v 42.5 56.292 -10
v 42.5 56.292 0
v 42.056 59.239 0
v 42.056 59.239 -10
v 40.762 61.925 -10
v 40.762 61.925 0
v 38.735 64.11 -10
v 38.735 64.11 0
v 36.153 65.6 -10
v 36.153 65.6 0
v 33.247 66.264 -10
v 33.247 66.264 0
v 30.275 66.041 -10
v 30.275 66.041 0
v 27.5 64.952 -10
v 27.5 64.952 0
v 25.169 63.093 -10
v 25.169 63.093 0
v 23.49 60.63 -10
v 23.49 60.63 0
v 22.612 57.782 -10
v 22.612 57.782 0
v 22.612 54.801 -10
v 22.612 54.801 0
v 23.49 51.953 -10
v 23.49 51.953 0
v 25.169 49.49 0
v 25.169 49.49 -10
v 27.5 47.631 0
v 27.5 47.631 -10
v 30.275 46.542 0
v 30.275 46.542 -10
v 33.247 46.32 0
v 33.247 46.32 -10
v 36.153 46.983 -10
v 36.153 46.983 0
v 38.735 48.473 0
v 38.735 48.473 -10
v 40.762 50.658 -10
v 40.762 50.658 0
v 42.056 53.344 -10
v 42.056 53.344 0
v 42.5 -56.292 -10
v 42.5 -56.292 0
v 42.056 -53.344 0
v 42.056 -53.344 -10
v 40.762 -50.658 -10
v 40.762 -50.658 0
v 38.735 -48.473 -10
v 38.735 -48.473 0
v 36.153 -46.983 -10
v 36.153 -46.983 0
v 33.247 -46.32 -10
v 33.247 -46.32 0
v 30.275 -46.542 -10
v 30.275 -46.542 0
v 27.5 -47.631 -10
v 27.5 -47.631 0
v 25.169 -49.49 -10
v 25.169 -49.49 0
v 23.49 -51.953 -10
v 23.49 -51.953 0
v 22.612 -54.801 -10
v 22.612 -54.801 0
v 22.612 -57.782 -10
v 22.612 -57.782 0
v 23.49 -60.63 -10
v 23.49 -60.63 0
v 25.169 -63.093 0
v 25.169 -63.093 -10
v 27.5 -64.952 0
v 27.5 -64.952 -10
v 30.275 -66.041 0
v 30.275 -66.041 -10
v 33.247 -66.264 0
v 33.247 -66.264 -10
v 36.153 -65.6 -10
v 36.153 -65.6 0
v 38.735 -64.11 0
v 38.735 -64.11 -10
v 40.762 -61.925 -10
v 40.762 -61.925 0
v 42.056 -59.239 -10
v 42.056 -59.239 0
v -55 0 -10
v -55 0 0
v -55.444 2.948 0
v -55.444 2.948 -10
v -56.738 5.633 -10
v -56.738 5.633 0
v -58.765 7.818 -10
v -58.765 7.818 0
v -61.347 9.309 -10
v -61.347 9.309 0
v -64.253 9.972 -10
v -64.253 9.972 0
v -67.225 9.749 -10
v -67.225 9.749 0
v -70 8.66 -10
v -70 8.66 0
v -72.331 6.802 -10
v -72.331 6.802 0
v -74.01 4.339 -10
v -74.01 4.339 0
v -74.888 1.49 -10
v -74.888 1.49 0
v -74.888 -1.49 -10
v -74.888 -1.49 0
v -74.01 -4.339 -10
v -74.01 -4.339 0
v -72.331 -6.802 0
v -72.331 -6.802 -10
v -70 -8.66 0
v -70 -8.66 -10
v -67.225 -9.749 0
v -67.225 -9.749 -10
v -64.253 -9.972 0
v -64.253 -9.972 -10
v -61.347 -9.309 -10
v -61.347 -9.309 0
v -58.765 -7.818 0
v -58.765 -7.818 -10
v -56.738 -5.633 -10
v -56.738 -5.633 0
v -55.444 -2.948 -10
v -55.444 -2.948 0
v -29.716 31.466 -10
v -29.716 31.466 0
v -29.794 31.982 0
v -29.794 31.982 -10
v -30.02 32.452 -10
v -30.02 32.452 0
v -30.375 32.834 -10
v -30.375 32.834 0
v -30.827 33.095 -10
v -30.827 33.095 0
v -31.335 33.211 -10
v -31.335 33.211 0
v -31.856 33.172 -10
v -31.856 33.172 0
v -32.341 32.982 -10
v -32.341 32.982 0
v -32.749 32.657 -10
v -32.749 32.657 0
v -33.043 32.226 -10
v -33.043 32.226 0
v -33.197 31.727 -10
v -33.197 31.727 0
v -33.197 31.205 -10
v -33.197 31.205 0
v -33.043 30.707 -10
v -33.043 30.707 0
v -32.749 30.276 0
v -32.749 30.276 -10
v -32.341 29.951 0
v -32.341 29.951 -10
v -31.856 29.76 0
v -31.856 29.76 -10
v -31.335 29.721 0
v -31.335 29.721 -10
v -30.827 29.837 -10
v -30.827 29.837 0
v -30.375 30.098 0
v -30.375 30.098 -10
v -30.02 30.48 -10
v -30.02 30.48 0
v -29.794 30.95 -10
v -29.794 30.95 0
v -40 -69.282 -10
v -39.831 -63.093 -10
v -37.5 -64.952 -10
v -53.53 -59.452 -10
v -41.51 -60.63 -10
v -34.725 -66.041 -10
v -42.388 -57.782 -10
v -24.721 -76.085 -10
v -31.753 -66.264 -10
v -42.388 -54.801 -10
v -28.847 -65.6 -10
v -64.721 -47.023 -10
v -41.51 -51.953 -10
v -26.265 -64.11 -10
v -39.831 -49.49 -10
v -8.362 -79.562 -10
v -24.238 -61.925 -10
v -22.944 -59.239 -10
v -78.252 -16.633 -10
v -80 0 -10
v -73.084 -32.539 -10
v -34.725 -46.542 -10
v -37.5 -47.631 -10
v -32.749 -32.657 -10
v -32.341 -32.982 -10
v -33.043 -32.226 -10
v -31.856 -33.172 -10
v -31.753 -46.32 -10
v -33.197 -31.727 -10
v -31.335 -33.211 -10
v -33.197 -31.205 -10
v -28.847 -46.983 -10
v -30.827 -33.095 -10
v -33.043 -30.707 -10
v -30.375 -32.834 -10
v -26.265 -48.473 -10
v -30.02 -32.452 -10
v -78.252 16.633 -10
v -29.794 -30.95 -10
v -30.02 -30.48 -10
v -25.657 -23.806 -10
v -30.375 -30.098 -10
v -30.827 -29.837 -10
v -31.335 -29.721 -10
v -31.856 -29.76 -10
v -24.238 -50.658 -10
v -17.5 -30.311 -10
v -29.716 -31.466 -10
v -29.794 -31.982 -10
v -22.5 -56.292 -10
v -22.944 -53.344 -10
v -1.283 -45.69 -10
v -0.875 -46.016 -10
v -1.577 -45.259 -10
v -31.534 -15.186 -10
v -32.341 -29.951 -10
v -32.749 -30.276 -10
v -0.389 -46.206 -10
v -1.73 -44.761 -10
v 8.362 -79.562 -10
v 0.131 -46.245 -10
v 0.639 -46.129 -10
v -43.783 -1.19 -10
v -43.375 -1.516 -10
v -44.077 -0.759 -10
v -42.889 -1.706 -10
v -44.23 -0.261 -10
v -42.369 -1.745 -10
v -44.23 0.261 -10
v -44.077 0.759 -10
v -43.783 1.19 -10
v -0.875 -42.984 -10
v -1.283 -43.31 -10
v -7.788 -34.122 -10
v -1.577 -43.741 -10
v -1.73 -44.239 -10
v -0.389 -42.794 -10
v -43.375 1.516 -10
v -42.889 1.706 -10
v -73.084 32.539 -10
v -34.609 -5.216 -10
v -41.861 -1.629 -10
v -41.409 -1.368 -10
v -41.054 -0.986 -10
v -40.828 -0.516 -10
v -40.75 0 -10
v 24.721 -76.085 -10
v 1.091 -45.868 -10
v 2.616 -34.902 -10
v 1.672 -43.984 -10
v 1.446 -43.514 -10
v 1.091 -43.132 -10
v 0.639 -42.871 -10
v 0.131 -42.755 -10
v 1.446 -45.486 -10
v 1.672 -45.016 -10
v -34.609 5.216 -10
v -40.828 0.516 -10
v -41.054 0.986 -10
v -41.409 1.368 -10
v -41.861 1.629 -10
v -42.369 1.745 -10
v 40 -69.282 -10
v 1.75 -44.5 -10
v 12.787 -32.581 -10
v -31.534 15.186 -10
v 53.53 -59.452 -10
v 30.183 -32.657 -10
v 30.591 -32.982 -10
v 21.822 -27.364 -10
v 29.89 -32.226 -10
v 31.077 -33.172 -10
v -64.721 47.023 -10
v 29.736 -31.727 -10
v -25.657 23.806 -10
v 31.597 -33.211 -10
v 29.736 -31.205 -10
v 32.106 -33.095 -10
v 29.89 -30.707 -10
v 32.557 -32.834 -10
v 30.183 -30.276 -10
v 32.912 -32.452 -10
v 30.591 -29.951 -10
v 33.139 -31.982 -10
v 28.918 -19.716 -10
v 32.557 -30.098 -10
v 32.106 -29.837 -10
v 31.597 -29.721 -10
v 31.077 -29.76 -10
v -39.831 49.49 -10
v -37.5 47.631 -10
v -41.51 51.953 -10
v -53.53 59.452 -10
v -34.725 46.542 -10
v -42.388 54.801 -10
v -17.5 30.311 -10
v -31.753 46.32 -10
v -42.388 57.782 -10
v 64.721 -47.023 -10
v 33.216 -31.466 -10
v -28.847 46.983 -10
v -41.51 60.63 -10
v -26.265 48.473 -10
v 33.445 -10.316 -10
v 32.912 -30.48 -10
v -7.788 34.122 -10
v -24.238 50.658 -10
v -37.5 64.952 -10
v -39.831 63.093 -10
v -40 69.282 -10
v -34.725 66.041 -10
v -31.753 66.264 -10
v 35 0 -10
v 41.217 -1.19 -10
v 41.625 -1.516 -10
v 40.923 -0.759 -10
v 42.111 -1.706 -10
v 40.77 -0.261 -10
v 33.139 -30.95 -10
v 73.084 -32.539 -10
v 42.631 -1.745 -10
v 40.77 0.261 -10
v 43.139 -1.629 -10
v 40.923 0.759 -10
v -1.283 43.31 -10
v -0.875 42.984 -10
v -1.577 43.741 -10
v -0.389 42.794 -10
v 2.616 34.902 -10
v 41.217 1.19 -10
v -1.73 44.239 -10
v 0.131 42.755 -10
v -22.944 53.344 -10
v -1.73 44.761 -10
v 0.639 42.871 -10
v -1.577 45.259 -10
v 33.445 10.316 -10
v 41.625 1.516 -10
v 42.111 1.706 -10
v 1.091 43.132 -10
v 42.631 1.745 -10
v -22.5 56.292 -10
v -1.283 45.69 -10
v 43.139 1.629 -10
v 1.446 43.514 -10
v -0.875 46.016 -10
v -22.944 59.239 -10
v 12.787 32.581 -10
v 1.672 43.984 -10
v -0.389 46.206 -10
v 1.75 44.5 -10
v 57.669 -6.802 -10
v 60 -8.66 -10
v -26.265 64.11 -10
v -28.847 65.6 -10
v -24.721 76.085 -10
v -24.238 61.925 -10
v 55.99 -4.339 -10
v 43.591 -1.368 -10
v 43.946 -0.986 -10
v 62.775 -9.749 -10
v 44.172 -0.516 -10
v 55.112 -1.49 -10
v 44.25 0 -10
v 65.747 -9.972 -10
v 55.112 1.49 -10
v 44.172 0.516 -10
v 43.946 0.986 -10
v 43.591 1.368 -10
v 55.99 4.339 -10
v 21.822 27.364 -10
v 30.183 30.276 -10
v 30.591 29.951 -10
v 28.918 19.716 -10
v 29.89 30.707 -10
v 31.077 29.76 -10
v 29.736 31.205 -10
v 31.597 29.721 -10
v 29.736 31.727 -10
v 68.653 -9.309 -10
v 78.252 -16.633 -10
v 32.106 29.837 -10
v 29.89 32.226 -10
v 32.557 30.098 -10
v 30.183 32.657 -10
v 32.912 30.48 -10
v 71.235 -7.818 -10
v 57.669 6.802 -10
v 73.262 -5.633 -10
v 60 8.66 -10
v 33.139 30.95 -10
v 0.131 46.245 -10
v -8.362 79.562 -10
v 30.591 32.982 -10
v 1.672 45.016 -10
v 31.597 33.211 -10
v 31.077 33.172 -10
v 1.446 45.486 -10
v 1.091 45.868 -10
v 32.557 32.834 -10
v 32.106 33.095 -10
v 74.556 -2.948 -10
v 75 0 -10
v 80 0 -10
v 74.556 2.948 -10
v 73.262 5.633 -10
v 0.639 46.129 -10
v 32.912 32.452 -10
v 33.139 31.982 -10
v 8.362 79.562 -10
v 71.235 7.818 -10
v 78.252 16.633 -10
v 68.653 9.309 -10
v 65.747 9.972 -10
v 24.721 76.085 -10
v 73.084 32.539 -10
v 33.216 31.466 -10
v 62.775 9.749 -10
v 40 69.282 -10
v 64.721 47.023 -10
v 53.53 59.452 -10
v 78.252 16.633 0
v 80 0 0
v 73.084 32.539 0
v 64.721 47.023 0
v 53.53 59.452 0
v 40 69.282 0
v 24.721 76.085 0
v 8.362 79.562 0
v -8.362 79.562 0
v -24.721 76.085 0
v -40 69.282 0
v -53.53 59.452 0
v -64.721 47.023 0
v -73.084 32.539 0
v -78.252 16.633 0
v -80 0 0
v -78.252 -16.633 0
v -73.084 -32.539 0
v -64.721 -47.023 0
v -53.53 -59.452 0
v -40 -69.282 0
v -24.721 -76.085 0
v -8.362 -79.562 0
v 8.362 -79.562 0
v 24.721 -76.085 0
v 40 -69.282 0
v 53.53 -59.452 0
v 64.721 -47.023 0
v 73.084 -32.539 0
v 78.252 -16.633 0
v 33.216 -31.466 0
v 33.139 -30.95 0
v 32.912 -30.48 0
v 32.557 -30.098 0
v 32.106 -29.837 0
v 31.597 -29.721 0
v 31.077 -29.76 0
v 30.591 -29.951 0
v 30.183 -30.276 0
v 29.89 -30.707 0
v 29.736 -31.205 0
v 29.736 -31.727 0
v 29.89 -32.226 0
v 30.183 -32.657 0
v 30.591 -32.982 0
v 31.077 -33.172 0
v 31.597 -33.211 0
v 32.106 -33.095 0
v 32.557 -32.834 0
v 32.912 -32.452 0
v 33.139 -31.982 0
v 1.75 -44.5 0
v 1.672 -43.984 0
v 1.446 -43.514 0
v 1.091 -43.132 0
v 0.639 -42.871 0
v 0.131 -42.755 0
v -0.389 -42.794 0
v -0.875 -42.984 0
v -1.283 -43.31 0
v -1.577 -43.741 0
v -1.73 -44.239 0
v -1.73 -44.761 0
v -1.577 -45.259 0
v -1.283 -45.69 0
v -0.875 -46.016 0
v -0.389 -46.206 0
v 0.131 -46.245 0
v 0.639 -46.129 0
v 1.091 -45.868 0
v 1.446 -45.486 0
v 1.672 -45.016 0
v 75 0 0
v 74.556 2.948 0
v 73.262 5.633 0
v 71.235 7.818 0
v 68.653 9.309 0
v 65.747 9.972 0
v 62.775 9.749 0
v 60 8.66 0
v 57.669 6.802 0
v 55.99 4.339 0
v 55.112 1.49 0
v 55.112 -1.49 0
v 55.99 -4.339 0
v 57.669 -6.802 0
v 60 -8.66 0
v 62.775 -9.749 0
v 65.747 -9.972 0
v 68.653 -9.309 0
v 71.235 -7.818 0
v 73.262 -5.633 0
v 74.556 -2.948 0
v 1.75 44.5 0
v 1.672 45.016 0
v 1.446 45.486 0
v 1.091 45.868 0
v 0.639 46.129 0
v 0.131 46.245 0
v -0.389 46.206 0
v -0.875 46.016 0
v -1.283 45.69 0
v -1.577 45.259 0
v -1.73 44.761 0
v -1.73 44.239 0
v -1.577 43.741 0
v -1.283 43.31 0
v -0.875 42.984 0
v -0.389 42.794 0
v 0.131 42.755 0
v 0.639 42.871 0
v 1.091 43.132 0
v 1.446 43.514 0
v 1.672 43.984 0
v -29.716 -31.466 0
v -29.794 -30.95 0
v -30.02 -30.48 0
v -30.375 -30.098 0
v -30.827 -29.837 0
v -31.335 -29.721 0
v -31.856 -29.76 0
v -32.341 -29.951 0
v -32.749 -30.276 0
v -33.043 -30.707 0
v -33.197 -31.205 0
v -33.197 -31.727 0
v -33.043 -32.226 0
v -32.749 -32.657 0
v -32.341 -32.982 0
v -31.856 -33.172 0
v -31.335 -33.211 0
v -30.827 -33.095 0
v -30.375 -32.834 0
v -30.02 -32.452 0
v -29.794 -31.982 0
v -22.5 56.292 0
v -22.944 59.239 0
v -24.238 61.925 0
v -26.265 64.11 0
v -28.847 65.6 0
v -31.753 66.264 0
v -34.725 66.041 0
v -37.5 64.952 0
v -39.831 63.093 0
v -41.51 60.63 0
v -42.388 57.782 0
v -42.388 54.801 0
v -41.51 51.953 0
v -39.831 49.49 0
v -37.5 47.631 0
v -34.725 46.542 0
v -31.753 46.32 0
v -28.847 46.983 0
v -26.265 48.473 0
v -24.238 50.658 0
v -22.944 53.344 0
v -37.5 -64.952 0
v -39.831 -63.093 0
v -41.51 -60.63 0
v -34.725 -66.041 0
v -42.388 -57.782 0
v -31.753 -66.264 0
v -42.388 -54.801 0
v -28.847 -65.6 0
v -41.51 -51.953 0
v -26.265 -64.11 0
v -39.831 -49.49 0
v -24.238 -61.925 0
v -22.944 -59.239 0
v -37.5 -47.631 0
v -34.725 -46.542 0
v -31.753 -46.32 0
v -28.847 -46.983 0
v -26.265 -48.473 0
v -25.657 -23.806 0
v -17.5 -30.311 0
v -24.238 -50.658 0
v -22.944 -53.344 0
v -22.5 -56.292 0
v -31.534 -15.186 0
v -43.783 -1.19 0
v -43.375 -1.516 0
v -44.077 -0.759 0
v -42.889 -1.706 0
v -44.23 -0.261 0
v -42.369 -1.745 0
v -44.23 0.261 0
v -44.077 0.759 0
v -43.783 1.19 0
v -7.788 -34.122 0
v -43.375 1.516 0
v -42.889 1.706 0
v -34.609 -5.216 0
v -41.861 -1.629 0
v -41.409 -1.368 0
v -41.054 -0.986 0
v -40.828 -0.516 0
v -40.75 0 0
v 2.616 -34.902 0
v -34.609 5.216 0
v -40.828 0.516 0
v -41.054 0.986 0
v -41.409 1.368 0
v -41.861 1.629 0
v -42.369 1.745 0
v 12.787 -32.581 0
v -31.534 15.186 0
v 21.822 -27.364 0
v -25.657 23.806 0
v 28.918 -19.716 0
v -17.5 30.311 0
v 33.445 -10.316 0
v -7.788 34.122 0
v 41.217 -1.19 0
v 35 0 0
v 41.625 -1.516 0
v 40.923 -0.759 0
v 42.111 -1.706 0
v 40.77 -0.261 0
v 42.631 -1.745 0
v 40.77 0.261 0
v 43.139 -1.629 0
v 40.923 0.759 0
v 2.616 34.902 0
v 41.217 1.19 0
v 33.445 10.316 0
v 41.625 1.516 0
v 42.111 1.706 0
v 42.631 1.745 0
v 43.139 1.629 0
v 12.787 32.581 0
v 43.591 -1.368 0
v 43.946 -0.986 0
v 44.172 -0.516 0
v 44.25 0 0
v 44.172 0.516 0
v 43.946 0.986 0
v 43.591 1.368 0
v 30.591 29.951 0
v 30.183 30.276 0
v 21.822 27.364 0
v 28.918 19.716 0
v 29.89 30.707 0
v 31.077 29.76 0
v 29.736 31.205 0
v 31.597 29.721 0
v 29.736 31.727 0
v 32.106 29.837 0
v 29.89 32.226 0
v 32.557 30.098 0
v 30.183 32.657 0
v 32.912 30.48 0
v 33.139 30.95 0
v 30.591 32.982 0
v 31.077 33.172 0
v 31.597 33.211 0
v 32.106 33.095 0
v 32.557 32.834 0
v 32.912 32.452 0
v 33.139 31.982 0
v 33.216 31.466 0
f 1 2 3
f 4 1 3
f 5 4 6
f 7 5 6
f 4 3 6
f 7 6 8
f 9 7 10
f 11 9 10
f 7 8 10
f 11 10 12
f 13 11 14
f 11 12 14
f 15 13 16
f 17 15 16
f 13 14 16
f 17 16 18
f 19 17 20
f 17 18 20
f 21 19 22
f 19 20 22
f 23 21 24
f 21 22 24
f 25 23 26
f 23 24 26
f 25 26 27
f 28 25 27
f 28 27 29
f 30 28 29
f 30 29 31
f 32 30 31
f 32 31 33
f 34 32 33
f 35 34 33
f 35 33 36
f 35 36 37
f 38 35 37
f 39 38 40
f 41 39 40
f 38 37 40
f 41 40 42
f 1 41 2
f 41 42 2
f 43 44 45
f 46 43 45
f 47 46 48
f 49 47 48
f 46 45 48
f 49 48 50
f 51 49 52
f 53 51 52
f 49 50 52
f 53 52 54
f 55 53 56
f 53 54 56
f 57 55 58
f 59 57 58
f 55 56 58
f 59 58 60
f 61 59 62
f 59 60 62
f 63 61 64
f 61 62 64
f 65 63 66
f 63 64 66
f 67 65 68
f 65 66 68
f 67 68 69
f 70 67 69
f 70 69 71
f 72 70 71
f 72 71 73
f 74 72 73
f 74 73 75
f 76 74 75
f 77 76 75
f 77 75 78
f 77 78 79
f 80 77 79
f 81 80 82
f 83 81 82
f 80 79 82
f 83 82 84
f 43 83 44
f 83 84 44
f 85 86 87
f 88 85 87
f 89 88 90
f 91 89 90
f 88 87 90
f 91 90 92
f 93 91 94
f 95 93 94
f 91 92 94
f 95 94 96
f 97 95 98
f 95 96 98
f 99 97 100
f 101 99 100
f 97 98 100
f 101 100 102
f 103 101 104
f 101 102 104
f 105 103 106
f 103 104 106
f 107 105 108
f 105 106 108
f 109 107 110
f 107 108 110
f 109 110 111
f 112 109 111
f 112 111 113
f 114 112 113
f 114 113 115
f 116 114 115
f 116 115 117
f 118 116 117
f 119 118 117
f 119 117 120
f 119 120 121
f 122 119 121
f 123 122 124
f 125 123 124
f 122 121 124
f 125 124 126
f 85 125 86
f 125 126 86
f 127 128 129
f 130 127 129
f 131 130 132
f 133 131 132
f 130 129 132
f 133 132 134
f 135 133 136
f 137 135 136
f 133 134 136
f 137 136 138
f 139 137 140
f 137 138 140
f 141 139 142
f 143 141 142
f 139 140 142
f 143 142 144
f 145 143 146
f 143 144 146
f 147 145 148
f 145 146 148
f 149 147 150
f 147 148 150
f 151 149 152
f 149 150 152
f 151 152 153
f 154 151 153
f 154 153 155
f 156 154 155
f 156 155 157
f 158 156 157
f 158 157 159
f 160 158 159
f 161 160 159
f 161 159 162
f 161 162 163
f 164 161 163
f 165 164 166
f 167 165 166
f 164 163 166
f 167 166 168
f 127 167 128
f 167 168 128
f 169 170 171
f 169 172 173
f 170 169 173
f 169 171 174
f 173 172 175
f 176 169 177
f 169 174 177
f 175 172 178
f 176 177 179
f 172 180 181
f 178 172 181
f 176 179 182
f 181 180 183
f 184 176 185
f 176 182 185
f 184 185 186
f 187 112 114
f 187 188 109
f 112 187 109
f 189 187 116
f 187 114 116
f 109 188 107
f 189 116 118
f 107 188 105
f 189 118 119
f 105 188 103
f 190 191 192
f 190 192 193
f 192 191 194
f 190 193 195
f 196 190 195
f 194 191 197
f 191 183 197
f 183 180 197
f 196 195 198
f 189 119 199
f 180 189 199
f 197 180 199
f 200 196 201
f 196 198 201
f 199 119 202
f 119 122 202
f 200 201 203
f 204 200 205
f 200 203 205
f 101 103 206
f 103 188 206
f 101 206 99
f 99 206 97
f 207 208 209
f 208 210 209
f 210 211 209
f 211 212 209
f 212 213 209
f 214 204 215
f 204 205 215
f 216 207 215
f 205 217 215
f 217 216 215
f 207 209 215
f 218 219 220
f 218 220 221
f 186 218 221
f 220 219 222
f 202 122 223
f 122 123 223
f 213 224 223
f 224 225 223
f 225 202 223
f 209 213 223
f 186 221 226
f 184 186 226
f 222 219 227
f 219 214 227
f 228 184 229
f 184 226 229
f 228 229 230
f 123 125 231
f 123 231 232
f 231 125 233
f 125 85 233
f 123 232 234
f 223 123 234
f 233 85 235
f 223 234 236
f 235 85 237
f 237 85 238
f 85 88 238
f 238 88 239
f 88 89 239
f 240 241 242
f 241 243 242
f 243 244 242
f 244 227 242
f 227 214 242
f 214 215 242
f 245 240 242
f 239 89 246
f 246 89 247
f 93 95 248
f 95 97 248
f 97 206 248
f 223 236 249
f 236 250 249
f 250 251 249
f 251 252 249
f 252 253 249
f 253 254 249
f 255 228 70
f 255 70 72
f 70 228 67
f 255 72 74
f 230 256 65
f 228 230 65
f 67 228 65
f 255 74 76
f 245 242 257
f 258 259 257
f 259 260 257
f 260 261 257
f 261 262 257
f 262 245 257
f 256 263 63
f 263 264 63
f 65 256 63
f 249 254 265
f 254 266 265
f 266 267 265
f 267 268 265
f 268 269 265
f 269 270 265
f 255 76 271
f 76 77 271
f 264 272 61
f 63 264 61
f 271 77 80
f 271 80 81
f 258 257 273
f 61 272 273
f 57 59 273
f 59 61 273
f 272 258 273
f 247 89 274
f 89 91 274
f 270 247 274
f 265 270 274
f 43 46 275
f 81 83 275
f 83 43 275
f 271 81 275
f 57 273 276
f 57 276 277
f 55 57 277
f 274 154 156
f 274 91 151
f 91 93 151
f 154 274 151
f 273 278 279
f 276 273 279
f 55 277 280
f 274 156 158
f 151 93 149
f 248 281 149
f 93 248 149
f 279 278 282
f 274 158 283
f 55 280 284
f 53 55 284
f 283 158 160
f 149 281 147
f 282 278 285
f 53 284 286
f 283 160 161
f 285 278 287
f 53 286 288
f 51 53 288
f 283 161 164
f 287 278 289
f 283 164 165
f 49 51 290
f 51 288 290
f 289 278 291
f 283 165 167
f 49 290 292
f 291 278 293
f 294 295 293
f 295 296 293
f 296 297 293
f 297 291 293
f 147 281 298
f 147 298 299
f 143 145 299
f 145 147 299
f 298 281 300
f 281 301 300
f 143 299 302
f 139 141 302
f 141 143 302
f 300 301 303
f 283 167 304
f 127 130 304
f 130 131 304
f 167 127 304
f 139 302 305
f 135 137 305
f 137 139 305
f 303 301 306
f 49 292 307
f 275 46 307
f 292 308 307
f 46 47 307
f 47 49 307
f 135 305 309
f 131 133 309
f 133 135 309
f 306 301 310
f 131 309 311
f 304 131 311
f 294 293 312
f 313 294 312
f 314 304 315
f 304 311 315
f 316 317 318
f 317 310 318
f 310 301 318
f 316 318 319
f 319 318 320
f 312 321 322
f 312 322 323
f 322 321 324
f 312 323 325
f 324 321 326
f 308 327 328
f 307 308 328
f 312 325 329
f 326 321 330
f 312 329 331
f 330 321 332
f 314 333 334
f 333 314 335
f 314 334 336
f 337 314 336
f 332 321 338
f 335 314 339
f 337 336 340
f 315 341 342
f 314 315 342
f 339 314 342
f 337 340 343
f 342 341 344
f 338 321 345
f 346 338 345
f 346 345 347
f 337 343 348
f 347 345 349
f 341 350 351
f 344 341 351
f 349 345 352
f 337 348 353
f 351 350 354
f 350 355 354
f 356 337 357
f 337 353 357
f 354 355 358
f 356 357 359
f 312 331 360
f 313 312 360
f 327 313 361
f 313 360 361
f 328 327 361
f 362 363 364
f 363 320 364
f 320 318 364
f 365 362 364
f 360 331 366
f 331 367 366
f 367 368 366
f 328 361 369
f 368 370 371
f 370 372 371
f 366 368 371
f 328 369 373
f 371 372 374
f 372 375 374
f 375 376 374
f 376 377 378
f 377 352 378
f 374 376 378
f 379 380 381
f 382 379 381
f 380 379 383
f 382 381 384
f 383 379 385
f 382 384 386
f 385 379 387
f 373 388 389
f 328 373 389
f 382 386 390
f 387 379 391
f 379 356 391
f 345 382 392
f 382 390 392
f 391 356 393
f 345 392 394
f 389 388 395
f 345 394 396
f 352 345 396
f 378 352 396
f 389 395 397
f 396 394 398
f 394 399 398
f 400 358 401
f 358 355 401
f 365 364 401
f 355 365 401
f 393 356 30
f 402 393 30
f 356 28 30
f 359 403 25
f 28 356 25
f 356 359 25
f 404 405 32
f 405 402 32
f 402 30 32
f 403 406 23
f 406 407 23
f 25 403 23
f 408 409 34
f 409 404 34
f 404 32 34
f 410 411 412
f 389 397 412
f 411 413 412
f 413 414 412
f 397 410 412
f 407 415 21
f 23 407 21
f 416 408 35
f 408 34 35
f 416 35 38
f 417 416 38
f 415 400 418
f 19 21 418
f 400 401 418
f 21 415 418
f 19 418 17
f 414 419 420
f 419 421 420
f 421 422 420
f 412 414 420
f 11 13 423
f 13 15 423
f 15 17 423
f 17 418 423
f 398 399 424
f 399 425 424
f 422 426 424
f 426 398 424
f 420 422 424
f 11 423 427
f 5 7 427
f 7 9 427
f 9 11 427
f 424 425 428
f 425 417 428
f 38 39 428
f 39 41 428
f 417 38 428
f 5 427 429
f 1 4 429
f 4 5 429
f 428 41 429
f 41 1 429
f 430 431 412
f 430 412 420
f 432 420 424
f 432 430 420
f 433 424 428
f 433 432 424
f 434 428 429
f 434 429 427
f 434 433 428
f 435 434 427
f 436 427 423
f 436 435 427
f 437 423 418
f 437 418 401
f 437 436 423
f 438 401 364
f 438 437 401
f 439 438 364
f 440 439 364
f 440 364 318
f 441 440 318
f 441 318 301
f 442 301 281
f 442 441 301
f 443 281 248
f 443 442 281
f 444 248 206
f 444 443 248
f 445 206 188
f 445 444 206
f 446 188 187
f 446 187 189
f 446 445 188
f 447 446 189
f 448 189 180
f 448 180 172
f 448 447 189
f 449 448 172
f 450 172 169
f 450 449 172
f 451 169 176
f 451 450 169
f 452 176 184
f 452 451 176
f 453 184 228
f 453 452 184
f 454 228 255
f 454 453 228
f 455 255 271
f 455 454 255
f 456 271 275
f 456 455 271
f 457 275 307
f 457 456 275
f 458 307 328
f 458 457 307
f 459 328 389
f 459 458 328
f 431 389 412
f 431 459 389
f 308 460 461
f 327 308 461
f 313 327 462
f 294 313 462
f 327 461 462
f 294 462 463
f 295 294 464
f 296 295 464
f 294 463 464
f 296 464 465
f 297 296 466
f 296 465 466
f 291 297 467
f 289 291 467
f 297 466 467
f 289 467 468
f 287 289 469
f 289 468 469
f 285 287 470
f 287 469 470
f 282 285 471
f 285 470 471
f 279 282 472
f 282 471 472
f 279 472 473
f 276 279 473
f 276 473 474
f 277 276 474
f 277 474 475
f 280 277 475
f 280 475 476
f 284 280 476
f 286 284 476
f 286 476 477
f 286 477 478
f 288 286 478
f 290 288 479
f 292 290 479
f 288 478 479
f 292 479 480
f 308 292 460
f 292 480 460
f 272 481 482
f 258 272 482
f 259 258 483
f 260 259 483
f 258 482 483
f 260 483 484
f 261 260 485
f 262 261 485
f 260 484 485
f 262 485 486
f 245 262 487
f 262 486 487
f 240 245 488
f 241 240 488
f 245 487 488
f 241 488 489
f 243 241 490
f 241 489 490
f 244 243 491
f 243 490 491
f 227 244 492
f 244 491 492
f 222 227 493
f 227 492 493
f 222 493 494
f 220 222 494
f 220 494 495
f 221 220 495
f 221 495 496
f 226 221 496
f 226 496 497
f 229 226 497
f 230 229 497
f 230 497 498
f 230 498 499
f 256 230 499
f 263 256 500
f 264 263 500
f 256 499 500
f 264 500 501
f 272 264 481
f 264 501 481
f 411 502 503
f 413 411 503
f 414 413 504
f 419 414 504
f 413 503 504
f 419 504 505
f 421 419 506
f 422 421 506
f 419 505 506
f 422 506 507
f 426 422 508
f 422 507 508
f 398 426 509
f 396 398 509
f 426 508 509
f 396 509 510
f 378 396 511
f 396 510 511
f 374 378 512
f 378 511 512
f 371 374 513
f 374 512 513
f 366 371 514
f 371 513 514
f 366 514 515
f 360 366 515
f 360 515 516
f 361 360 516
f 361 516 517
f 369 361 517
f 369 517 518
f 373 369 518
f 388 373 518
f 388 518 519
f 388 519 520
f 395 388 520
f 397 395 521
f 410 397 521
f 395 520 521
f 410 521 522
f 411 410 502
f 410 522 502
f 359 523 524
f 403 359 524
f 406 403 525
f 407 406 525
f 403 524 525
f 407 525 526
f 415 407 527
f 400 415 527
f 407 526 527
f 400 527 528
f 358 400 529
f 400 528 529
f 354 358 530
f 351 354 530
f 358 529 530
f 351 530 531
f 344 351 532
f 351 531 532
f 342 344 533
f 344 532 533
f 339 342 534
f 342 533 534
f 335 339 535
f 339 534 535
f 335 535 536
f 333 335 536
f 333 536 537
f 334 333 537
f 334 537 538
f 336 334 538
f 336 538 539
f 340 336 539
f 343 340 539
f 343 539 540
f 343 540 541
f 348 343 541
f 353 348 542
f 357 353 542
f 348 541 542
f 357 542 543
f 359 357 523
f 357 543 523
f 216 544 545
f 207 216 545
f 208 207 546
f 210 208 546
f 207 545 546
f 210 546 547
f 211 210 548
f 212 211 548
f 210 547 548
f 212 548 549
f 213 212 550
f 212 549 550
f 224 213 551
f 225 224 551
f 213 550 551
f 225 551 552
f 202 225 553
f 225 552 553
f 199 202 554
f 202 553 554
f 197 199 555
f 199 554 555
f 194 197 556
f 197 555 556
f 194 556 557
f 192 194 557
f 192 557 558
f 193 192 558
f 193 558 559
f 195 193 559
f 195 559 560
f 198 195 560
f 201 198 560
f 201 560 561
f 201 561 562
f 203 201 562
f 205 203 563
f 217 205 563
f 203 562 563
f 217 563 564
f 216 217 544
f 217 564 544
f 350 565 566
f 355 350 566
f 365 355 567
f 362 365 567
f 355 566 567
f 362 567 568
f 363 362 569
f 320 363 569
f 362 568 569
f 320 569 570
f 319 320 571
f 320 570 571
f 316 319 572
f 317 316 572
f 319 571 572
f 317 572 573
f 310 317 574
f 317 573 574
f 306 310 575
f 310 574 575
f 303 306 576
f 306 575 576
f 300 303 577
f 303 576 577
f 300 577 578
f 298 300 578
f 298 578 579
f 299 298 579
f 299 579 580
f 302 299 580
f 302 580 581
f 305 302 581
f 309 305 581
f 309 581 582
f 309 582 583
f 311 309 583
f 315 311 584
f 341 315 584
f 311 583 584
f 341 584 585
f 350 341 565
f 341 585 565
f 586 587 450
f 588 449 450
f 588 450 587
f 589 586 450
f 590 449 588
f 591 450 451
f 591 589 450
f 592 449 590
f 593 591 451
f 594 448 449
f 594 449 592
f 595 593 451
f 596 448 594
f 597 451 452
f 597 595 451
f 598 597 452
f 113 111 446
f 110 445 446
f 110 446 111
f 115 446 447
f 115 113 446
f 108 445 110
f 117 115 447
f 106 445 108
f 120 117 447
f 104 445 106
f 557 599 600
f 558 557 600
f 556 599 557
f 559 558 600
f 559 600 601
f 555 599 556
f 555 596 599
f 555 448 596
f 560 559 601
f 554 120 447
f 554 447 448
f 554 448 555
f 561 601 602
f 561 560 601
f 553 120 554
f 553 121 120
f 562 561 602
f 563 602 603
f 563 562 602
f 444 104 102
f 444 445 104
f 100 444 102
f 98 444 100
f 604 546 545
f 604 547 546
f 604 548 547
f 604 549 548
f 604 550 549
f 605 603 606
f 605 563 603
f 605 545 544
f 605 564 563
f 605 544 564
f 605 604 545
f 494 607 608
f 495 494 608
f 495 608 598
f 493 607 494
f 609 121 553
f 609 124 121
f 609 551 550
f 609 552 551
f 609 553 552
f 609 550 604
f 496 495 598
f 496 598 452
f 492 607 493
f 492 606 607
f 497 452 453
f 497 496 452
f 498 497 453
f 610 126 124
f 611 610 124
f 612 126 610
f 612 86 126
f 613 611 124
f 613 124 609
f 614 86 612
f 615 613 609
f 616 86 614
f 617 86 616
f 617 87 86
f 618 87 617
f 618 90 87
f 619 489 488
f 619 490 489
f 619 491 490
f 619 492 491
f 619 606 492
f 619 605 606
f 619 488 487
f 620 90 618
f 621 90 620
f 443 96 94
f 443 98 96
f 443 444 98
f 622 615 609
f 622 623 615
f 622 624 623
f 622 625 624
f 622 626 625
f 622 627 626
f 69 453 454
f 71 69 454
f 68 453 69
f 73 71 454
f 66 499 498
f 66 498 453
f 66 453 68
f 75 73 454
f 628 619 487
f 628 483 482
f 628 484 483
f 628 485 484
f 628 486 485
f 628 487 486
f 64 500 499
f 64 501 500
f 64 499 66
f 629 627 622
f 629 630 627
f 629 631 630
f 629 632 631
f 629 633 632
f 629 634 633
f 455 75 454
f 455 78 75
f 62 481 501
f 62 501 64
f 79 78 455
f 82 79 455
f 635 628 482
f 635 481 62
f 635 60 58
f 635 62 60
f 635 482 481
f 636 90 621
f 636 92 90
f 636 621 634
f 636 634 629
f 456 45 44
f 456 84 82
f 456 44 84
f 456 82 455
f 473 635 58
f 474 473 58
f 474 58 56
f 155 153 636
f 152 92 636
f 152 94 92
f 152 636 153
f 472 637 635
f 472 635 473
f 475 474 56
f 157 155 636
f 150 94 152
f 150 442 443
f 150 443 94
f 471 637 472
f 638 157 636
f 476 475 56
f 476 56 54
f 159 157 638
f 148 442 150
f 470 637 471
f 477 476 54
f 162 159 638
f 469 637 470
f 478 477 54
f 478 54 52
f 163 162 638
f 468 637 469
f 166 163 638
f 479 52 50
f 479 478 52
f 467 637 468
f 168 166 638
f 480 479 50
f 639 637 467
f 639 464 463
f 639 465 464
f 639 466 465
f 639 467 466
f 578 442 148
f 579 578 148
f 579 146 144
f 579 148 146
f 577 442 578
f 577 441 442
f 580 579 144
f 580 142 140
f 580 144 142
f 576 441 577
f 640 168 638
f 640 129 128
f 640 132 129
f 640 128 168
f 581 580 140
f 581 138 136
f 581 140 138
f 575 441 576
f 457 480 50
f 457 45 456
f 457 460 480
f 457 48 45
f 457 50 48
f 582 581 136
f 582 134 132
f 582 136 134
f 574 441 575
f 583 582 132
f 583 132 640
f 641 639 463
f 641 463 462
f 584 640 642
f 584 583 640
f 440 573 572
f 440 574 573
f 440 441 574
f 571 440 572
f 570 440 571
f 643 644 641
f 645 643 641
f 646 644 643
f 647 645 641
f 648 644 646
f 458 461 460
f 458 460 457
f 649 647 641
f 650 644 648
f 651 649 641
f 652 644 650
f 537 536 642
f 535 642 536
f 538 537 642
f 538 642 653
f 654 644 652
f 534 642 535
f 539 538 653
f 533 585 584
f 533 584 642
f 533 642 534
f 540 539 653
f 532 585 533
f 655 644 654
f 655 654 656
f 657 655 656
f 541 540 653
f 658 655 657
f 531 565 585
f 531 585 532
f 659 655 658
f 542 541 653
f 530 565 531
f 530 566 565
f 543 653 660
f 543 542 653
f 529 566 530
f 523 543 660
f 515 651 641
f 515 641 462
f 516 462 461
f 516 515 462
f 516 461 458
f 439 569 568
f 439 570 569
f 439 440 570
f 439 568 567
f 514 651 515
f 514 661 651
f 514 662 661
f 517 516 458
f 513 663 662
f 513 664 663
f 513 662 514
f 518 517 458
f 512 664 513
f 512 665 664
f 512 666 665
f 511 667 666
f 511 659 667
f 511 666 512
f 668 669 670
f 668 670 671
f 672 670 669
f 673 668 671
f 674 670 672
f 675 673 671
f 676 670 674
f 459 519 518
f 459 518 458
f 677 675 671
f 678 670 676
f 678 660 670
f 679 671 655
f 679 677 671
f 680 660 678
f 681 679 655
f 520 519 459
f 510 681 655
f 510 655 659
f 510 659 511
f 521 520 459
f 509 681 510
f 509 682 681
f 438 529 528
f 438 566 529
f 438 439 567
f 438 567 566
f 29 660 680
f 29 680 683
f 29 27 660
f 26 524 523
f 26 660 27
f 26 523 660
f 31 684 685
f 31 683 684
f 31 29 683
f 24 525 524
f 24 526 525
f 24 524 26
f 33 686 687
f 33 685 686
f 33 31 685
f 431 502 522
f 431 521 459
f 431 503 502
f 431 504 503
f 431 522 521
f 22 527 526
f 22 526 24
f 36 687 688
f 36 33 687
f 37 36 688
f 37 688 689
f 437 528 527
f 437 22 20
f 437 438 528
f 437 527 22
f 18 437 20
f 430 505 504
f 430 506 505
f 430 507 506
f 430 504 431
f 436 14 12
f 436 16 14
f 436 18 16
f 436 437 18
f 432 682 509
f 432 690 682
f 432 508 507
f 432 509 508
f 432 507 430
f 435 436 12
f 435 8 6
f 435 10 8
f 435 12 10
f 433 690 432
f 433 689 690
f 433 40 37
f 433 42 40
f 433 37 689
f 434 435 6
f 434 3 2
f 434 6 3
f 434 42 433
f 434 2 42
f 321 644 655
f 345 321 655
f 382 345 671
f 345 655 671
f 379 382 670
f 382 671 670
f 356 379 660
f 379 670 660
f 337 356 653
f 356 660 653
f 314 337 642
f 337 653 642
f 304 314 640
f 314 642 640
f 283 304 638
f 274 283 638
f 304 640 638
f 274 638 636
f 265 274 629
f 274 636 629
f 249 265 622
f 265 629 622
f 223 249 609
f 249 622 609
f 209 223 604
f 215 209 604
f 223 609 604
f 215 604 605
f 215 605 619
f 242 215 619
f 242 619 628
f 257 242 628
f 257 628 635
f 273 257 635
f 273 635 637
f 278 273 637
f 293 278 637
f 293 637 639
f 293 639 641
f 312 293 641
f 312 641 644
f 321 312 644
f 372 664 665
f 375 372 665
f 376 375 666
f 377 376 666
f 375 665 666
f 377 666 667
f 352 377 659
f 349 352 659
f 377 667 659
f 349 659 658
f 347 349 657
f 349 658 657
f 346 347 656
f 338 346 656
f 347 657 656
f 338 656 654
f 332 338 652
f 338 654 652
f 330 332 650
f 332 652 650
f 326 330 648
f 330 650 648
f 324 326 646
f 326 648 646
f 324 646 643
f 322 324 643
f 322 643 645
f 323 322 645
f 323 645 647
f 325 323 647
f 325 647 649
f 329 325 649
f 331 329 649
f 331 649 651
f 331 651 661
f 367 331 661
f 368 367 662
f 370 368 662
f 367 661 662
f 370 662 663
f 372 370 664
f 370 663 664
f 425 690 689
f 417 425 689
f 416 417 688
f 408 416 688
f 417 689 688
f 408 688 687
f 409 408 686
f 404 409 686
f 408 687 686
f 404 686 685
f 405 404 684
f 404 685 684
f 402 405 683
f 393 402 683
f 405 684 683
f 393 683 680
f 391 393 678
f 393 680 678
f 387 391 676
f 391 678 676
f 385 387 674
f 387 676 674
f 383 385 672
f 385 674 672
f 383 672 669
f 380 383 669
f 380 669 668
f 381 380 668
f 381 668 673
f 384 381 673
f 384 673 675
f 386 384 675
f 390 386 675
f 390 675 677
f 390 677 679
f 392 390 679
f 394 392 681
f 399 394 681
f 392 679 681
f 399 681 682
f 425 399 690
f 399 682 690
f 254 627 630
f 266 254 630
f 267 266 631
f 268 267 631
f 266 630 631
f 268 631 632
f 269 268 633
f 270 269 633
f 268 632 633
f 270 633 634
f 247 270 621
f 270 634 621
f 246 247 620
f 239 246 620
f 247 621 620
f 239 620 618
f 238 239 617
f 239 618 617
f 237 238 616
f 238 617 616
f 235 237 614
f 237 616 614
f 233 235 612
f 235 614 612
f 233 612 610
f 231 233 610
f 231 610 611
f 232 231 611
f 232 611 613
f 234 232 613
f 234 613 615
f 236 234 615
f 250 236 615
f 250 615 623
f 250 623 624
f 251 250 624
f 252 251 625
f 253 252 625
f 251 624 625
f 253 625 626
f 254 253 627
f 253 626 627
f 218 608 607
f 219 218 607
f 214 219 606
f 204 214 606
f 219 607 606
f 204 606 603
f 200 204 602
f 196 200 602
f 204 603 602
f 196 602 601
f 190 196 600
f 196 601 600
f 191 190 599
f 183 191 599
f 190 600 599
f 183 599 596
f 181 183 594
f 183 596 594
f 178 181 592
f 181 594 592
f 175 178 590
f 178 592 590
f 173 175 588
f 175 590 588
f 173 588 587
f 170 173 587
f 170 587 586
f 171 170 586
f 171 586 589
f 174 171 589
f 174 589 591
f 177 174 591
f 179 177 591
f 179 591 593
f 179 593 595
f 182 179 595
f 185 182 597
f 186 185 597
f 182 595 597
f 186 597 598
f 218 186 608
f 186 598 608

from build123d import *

# Parameters (mm, degrees)
SKETCH_3_R          = 80
EXTRUDE_1_DEPTH     = 10
SKETCH_4_R          = 35
CUT_EXTRUDE_1_DEPTH = 7
SKETCH_6_R          = 10
CUT_EXTRUDE_3_DEPTH = 10
SKETCH_5_R          = 1.75
CUT_EXTRUDE_4_DEPTH = 10
SKETCH_7_R          = 35
CUT_EXTRUDE_5_DEPTH = 20


with BuildPart() as part:
    # 草图3 → 凸台-拉伸1 (new body)
    with BuildSketch(Plane.XY):
        Circle(SKETCH_3_R)
    extrude(amount=-EXTRUDE_1_DEPTH)

    # 草图4 → 切除-拉伸1 (cut)
    with BuildSketch(Plane.XY):
        Circle(SKETCH_4_R)
    extrude(amount=-CUT_EXTRUDE_1_DEPTH, mode=Mode.SUBTRACT)

    # 草图6 → 切除-拉伸3 (cut)
    with BuildSketch(Plane.XY):
        with Locations((-32.5, 56.291651246)):
            Circle(SKETCH_6_R)
        with BuildLine():
            ThreePointArc((-75, 0), (-65, -10), (-55, 0))
            Line((-55, 0), (-75, 0))
        make_face()
        with BuildLine():
            Line((-75, 0), (-55, 0))
            ThreePointArc((-55, 0), (-65, 10), (-75, 0))
        make_face()
        with Locations((-32.5, -56.291651246)):
            Circle(SKETCH_6_R)
        with Locations((32.5, -56.291651246)):
            Circle(SKETCH_6_R)
        with Locations((65, 0)):
            Circle(SKETCH_6_R)
        with Locations((32.5, 56.291651246)):
            Circle(SKETCH_6_R)
    extrude(amount=-CUT_EXTRUDE_3_DEPTH, mode=Mode.SUBTRACT)

    # 草图5 → 切除-拉伸4 (cut)
    with BuildSketch(Plane.XY):
        with Locations((0, 44.5)):
            Circle(SKETCH_5_R)
        with Locations((31.466251763, 31.466251763)):
            Circle(SKETCH_5_R)
        with Locations((42.5, 0)):
            Circle(SKETCH_5_R)
        with Locations((31.466251763, -31.466251763)):
            Circle(SKETCH_5_R)
        with Locations((-31.466251763, -31.466251763)):
            Circle(SKETCH_5_R)
        with BuildLine():
            ThreePointArc((-44.25, 0), (-42.5, -1.75), (-40.75, 0))
            Line((-40.75, 0), (-44.25, 0))
        make_face()
        with BuildLine():
            Line((-44.25, 0), (-40.75, 0))
            ThreePointArc((-40.75, 0), (-42.5, 1.75), (-44.25, 0))
        make_face()
        with Locations((-31.466251763, 31.466251763)):
            Circle(SKETCH_5_R)
        with Locations((0, -44.5)):
            Circle(SKETCH_5_R)
    extrude(amount=-CUT_EXTRUDE_4_DEPTH, mode=Mode.SUBTRACT)

    # 草图7 → 切除-拉伸5 (cut, symmetric)
    with BuildSketch(Plane.XY):
        Circle(SKETCH_7_R)
    extrude(amount=CUT_EXTRUDE_5_DEPTH, both=True, mode=Mode.SUBTRACT)


solid = part.part
